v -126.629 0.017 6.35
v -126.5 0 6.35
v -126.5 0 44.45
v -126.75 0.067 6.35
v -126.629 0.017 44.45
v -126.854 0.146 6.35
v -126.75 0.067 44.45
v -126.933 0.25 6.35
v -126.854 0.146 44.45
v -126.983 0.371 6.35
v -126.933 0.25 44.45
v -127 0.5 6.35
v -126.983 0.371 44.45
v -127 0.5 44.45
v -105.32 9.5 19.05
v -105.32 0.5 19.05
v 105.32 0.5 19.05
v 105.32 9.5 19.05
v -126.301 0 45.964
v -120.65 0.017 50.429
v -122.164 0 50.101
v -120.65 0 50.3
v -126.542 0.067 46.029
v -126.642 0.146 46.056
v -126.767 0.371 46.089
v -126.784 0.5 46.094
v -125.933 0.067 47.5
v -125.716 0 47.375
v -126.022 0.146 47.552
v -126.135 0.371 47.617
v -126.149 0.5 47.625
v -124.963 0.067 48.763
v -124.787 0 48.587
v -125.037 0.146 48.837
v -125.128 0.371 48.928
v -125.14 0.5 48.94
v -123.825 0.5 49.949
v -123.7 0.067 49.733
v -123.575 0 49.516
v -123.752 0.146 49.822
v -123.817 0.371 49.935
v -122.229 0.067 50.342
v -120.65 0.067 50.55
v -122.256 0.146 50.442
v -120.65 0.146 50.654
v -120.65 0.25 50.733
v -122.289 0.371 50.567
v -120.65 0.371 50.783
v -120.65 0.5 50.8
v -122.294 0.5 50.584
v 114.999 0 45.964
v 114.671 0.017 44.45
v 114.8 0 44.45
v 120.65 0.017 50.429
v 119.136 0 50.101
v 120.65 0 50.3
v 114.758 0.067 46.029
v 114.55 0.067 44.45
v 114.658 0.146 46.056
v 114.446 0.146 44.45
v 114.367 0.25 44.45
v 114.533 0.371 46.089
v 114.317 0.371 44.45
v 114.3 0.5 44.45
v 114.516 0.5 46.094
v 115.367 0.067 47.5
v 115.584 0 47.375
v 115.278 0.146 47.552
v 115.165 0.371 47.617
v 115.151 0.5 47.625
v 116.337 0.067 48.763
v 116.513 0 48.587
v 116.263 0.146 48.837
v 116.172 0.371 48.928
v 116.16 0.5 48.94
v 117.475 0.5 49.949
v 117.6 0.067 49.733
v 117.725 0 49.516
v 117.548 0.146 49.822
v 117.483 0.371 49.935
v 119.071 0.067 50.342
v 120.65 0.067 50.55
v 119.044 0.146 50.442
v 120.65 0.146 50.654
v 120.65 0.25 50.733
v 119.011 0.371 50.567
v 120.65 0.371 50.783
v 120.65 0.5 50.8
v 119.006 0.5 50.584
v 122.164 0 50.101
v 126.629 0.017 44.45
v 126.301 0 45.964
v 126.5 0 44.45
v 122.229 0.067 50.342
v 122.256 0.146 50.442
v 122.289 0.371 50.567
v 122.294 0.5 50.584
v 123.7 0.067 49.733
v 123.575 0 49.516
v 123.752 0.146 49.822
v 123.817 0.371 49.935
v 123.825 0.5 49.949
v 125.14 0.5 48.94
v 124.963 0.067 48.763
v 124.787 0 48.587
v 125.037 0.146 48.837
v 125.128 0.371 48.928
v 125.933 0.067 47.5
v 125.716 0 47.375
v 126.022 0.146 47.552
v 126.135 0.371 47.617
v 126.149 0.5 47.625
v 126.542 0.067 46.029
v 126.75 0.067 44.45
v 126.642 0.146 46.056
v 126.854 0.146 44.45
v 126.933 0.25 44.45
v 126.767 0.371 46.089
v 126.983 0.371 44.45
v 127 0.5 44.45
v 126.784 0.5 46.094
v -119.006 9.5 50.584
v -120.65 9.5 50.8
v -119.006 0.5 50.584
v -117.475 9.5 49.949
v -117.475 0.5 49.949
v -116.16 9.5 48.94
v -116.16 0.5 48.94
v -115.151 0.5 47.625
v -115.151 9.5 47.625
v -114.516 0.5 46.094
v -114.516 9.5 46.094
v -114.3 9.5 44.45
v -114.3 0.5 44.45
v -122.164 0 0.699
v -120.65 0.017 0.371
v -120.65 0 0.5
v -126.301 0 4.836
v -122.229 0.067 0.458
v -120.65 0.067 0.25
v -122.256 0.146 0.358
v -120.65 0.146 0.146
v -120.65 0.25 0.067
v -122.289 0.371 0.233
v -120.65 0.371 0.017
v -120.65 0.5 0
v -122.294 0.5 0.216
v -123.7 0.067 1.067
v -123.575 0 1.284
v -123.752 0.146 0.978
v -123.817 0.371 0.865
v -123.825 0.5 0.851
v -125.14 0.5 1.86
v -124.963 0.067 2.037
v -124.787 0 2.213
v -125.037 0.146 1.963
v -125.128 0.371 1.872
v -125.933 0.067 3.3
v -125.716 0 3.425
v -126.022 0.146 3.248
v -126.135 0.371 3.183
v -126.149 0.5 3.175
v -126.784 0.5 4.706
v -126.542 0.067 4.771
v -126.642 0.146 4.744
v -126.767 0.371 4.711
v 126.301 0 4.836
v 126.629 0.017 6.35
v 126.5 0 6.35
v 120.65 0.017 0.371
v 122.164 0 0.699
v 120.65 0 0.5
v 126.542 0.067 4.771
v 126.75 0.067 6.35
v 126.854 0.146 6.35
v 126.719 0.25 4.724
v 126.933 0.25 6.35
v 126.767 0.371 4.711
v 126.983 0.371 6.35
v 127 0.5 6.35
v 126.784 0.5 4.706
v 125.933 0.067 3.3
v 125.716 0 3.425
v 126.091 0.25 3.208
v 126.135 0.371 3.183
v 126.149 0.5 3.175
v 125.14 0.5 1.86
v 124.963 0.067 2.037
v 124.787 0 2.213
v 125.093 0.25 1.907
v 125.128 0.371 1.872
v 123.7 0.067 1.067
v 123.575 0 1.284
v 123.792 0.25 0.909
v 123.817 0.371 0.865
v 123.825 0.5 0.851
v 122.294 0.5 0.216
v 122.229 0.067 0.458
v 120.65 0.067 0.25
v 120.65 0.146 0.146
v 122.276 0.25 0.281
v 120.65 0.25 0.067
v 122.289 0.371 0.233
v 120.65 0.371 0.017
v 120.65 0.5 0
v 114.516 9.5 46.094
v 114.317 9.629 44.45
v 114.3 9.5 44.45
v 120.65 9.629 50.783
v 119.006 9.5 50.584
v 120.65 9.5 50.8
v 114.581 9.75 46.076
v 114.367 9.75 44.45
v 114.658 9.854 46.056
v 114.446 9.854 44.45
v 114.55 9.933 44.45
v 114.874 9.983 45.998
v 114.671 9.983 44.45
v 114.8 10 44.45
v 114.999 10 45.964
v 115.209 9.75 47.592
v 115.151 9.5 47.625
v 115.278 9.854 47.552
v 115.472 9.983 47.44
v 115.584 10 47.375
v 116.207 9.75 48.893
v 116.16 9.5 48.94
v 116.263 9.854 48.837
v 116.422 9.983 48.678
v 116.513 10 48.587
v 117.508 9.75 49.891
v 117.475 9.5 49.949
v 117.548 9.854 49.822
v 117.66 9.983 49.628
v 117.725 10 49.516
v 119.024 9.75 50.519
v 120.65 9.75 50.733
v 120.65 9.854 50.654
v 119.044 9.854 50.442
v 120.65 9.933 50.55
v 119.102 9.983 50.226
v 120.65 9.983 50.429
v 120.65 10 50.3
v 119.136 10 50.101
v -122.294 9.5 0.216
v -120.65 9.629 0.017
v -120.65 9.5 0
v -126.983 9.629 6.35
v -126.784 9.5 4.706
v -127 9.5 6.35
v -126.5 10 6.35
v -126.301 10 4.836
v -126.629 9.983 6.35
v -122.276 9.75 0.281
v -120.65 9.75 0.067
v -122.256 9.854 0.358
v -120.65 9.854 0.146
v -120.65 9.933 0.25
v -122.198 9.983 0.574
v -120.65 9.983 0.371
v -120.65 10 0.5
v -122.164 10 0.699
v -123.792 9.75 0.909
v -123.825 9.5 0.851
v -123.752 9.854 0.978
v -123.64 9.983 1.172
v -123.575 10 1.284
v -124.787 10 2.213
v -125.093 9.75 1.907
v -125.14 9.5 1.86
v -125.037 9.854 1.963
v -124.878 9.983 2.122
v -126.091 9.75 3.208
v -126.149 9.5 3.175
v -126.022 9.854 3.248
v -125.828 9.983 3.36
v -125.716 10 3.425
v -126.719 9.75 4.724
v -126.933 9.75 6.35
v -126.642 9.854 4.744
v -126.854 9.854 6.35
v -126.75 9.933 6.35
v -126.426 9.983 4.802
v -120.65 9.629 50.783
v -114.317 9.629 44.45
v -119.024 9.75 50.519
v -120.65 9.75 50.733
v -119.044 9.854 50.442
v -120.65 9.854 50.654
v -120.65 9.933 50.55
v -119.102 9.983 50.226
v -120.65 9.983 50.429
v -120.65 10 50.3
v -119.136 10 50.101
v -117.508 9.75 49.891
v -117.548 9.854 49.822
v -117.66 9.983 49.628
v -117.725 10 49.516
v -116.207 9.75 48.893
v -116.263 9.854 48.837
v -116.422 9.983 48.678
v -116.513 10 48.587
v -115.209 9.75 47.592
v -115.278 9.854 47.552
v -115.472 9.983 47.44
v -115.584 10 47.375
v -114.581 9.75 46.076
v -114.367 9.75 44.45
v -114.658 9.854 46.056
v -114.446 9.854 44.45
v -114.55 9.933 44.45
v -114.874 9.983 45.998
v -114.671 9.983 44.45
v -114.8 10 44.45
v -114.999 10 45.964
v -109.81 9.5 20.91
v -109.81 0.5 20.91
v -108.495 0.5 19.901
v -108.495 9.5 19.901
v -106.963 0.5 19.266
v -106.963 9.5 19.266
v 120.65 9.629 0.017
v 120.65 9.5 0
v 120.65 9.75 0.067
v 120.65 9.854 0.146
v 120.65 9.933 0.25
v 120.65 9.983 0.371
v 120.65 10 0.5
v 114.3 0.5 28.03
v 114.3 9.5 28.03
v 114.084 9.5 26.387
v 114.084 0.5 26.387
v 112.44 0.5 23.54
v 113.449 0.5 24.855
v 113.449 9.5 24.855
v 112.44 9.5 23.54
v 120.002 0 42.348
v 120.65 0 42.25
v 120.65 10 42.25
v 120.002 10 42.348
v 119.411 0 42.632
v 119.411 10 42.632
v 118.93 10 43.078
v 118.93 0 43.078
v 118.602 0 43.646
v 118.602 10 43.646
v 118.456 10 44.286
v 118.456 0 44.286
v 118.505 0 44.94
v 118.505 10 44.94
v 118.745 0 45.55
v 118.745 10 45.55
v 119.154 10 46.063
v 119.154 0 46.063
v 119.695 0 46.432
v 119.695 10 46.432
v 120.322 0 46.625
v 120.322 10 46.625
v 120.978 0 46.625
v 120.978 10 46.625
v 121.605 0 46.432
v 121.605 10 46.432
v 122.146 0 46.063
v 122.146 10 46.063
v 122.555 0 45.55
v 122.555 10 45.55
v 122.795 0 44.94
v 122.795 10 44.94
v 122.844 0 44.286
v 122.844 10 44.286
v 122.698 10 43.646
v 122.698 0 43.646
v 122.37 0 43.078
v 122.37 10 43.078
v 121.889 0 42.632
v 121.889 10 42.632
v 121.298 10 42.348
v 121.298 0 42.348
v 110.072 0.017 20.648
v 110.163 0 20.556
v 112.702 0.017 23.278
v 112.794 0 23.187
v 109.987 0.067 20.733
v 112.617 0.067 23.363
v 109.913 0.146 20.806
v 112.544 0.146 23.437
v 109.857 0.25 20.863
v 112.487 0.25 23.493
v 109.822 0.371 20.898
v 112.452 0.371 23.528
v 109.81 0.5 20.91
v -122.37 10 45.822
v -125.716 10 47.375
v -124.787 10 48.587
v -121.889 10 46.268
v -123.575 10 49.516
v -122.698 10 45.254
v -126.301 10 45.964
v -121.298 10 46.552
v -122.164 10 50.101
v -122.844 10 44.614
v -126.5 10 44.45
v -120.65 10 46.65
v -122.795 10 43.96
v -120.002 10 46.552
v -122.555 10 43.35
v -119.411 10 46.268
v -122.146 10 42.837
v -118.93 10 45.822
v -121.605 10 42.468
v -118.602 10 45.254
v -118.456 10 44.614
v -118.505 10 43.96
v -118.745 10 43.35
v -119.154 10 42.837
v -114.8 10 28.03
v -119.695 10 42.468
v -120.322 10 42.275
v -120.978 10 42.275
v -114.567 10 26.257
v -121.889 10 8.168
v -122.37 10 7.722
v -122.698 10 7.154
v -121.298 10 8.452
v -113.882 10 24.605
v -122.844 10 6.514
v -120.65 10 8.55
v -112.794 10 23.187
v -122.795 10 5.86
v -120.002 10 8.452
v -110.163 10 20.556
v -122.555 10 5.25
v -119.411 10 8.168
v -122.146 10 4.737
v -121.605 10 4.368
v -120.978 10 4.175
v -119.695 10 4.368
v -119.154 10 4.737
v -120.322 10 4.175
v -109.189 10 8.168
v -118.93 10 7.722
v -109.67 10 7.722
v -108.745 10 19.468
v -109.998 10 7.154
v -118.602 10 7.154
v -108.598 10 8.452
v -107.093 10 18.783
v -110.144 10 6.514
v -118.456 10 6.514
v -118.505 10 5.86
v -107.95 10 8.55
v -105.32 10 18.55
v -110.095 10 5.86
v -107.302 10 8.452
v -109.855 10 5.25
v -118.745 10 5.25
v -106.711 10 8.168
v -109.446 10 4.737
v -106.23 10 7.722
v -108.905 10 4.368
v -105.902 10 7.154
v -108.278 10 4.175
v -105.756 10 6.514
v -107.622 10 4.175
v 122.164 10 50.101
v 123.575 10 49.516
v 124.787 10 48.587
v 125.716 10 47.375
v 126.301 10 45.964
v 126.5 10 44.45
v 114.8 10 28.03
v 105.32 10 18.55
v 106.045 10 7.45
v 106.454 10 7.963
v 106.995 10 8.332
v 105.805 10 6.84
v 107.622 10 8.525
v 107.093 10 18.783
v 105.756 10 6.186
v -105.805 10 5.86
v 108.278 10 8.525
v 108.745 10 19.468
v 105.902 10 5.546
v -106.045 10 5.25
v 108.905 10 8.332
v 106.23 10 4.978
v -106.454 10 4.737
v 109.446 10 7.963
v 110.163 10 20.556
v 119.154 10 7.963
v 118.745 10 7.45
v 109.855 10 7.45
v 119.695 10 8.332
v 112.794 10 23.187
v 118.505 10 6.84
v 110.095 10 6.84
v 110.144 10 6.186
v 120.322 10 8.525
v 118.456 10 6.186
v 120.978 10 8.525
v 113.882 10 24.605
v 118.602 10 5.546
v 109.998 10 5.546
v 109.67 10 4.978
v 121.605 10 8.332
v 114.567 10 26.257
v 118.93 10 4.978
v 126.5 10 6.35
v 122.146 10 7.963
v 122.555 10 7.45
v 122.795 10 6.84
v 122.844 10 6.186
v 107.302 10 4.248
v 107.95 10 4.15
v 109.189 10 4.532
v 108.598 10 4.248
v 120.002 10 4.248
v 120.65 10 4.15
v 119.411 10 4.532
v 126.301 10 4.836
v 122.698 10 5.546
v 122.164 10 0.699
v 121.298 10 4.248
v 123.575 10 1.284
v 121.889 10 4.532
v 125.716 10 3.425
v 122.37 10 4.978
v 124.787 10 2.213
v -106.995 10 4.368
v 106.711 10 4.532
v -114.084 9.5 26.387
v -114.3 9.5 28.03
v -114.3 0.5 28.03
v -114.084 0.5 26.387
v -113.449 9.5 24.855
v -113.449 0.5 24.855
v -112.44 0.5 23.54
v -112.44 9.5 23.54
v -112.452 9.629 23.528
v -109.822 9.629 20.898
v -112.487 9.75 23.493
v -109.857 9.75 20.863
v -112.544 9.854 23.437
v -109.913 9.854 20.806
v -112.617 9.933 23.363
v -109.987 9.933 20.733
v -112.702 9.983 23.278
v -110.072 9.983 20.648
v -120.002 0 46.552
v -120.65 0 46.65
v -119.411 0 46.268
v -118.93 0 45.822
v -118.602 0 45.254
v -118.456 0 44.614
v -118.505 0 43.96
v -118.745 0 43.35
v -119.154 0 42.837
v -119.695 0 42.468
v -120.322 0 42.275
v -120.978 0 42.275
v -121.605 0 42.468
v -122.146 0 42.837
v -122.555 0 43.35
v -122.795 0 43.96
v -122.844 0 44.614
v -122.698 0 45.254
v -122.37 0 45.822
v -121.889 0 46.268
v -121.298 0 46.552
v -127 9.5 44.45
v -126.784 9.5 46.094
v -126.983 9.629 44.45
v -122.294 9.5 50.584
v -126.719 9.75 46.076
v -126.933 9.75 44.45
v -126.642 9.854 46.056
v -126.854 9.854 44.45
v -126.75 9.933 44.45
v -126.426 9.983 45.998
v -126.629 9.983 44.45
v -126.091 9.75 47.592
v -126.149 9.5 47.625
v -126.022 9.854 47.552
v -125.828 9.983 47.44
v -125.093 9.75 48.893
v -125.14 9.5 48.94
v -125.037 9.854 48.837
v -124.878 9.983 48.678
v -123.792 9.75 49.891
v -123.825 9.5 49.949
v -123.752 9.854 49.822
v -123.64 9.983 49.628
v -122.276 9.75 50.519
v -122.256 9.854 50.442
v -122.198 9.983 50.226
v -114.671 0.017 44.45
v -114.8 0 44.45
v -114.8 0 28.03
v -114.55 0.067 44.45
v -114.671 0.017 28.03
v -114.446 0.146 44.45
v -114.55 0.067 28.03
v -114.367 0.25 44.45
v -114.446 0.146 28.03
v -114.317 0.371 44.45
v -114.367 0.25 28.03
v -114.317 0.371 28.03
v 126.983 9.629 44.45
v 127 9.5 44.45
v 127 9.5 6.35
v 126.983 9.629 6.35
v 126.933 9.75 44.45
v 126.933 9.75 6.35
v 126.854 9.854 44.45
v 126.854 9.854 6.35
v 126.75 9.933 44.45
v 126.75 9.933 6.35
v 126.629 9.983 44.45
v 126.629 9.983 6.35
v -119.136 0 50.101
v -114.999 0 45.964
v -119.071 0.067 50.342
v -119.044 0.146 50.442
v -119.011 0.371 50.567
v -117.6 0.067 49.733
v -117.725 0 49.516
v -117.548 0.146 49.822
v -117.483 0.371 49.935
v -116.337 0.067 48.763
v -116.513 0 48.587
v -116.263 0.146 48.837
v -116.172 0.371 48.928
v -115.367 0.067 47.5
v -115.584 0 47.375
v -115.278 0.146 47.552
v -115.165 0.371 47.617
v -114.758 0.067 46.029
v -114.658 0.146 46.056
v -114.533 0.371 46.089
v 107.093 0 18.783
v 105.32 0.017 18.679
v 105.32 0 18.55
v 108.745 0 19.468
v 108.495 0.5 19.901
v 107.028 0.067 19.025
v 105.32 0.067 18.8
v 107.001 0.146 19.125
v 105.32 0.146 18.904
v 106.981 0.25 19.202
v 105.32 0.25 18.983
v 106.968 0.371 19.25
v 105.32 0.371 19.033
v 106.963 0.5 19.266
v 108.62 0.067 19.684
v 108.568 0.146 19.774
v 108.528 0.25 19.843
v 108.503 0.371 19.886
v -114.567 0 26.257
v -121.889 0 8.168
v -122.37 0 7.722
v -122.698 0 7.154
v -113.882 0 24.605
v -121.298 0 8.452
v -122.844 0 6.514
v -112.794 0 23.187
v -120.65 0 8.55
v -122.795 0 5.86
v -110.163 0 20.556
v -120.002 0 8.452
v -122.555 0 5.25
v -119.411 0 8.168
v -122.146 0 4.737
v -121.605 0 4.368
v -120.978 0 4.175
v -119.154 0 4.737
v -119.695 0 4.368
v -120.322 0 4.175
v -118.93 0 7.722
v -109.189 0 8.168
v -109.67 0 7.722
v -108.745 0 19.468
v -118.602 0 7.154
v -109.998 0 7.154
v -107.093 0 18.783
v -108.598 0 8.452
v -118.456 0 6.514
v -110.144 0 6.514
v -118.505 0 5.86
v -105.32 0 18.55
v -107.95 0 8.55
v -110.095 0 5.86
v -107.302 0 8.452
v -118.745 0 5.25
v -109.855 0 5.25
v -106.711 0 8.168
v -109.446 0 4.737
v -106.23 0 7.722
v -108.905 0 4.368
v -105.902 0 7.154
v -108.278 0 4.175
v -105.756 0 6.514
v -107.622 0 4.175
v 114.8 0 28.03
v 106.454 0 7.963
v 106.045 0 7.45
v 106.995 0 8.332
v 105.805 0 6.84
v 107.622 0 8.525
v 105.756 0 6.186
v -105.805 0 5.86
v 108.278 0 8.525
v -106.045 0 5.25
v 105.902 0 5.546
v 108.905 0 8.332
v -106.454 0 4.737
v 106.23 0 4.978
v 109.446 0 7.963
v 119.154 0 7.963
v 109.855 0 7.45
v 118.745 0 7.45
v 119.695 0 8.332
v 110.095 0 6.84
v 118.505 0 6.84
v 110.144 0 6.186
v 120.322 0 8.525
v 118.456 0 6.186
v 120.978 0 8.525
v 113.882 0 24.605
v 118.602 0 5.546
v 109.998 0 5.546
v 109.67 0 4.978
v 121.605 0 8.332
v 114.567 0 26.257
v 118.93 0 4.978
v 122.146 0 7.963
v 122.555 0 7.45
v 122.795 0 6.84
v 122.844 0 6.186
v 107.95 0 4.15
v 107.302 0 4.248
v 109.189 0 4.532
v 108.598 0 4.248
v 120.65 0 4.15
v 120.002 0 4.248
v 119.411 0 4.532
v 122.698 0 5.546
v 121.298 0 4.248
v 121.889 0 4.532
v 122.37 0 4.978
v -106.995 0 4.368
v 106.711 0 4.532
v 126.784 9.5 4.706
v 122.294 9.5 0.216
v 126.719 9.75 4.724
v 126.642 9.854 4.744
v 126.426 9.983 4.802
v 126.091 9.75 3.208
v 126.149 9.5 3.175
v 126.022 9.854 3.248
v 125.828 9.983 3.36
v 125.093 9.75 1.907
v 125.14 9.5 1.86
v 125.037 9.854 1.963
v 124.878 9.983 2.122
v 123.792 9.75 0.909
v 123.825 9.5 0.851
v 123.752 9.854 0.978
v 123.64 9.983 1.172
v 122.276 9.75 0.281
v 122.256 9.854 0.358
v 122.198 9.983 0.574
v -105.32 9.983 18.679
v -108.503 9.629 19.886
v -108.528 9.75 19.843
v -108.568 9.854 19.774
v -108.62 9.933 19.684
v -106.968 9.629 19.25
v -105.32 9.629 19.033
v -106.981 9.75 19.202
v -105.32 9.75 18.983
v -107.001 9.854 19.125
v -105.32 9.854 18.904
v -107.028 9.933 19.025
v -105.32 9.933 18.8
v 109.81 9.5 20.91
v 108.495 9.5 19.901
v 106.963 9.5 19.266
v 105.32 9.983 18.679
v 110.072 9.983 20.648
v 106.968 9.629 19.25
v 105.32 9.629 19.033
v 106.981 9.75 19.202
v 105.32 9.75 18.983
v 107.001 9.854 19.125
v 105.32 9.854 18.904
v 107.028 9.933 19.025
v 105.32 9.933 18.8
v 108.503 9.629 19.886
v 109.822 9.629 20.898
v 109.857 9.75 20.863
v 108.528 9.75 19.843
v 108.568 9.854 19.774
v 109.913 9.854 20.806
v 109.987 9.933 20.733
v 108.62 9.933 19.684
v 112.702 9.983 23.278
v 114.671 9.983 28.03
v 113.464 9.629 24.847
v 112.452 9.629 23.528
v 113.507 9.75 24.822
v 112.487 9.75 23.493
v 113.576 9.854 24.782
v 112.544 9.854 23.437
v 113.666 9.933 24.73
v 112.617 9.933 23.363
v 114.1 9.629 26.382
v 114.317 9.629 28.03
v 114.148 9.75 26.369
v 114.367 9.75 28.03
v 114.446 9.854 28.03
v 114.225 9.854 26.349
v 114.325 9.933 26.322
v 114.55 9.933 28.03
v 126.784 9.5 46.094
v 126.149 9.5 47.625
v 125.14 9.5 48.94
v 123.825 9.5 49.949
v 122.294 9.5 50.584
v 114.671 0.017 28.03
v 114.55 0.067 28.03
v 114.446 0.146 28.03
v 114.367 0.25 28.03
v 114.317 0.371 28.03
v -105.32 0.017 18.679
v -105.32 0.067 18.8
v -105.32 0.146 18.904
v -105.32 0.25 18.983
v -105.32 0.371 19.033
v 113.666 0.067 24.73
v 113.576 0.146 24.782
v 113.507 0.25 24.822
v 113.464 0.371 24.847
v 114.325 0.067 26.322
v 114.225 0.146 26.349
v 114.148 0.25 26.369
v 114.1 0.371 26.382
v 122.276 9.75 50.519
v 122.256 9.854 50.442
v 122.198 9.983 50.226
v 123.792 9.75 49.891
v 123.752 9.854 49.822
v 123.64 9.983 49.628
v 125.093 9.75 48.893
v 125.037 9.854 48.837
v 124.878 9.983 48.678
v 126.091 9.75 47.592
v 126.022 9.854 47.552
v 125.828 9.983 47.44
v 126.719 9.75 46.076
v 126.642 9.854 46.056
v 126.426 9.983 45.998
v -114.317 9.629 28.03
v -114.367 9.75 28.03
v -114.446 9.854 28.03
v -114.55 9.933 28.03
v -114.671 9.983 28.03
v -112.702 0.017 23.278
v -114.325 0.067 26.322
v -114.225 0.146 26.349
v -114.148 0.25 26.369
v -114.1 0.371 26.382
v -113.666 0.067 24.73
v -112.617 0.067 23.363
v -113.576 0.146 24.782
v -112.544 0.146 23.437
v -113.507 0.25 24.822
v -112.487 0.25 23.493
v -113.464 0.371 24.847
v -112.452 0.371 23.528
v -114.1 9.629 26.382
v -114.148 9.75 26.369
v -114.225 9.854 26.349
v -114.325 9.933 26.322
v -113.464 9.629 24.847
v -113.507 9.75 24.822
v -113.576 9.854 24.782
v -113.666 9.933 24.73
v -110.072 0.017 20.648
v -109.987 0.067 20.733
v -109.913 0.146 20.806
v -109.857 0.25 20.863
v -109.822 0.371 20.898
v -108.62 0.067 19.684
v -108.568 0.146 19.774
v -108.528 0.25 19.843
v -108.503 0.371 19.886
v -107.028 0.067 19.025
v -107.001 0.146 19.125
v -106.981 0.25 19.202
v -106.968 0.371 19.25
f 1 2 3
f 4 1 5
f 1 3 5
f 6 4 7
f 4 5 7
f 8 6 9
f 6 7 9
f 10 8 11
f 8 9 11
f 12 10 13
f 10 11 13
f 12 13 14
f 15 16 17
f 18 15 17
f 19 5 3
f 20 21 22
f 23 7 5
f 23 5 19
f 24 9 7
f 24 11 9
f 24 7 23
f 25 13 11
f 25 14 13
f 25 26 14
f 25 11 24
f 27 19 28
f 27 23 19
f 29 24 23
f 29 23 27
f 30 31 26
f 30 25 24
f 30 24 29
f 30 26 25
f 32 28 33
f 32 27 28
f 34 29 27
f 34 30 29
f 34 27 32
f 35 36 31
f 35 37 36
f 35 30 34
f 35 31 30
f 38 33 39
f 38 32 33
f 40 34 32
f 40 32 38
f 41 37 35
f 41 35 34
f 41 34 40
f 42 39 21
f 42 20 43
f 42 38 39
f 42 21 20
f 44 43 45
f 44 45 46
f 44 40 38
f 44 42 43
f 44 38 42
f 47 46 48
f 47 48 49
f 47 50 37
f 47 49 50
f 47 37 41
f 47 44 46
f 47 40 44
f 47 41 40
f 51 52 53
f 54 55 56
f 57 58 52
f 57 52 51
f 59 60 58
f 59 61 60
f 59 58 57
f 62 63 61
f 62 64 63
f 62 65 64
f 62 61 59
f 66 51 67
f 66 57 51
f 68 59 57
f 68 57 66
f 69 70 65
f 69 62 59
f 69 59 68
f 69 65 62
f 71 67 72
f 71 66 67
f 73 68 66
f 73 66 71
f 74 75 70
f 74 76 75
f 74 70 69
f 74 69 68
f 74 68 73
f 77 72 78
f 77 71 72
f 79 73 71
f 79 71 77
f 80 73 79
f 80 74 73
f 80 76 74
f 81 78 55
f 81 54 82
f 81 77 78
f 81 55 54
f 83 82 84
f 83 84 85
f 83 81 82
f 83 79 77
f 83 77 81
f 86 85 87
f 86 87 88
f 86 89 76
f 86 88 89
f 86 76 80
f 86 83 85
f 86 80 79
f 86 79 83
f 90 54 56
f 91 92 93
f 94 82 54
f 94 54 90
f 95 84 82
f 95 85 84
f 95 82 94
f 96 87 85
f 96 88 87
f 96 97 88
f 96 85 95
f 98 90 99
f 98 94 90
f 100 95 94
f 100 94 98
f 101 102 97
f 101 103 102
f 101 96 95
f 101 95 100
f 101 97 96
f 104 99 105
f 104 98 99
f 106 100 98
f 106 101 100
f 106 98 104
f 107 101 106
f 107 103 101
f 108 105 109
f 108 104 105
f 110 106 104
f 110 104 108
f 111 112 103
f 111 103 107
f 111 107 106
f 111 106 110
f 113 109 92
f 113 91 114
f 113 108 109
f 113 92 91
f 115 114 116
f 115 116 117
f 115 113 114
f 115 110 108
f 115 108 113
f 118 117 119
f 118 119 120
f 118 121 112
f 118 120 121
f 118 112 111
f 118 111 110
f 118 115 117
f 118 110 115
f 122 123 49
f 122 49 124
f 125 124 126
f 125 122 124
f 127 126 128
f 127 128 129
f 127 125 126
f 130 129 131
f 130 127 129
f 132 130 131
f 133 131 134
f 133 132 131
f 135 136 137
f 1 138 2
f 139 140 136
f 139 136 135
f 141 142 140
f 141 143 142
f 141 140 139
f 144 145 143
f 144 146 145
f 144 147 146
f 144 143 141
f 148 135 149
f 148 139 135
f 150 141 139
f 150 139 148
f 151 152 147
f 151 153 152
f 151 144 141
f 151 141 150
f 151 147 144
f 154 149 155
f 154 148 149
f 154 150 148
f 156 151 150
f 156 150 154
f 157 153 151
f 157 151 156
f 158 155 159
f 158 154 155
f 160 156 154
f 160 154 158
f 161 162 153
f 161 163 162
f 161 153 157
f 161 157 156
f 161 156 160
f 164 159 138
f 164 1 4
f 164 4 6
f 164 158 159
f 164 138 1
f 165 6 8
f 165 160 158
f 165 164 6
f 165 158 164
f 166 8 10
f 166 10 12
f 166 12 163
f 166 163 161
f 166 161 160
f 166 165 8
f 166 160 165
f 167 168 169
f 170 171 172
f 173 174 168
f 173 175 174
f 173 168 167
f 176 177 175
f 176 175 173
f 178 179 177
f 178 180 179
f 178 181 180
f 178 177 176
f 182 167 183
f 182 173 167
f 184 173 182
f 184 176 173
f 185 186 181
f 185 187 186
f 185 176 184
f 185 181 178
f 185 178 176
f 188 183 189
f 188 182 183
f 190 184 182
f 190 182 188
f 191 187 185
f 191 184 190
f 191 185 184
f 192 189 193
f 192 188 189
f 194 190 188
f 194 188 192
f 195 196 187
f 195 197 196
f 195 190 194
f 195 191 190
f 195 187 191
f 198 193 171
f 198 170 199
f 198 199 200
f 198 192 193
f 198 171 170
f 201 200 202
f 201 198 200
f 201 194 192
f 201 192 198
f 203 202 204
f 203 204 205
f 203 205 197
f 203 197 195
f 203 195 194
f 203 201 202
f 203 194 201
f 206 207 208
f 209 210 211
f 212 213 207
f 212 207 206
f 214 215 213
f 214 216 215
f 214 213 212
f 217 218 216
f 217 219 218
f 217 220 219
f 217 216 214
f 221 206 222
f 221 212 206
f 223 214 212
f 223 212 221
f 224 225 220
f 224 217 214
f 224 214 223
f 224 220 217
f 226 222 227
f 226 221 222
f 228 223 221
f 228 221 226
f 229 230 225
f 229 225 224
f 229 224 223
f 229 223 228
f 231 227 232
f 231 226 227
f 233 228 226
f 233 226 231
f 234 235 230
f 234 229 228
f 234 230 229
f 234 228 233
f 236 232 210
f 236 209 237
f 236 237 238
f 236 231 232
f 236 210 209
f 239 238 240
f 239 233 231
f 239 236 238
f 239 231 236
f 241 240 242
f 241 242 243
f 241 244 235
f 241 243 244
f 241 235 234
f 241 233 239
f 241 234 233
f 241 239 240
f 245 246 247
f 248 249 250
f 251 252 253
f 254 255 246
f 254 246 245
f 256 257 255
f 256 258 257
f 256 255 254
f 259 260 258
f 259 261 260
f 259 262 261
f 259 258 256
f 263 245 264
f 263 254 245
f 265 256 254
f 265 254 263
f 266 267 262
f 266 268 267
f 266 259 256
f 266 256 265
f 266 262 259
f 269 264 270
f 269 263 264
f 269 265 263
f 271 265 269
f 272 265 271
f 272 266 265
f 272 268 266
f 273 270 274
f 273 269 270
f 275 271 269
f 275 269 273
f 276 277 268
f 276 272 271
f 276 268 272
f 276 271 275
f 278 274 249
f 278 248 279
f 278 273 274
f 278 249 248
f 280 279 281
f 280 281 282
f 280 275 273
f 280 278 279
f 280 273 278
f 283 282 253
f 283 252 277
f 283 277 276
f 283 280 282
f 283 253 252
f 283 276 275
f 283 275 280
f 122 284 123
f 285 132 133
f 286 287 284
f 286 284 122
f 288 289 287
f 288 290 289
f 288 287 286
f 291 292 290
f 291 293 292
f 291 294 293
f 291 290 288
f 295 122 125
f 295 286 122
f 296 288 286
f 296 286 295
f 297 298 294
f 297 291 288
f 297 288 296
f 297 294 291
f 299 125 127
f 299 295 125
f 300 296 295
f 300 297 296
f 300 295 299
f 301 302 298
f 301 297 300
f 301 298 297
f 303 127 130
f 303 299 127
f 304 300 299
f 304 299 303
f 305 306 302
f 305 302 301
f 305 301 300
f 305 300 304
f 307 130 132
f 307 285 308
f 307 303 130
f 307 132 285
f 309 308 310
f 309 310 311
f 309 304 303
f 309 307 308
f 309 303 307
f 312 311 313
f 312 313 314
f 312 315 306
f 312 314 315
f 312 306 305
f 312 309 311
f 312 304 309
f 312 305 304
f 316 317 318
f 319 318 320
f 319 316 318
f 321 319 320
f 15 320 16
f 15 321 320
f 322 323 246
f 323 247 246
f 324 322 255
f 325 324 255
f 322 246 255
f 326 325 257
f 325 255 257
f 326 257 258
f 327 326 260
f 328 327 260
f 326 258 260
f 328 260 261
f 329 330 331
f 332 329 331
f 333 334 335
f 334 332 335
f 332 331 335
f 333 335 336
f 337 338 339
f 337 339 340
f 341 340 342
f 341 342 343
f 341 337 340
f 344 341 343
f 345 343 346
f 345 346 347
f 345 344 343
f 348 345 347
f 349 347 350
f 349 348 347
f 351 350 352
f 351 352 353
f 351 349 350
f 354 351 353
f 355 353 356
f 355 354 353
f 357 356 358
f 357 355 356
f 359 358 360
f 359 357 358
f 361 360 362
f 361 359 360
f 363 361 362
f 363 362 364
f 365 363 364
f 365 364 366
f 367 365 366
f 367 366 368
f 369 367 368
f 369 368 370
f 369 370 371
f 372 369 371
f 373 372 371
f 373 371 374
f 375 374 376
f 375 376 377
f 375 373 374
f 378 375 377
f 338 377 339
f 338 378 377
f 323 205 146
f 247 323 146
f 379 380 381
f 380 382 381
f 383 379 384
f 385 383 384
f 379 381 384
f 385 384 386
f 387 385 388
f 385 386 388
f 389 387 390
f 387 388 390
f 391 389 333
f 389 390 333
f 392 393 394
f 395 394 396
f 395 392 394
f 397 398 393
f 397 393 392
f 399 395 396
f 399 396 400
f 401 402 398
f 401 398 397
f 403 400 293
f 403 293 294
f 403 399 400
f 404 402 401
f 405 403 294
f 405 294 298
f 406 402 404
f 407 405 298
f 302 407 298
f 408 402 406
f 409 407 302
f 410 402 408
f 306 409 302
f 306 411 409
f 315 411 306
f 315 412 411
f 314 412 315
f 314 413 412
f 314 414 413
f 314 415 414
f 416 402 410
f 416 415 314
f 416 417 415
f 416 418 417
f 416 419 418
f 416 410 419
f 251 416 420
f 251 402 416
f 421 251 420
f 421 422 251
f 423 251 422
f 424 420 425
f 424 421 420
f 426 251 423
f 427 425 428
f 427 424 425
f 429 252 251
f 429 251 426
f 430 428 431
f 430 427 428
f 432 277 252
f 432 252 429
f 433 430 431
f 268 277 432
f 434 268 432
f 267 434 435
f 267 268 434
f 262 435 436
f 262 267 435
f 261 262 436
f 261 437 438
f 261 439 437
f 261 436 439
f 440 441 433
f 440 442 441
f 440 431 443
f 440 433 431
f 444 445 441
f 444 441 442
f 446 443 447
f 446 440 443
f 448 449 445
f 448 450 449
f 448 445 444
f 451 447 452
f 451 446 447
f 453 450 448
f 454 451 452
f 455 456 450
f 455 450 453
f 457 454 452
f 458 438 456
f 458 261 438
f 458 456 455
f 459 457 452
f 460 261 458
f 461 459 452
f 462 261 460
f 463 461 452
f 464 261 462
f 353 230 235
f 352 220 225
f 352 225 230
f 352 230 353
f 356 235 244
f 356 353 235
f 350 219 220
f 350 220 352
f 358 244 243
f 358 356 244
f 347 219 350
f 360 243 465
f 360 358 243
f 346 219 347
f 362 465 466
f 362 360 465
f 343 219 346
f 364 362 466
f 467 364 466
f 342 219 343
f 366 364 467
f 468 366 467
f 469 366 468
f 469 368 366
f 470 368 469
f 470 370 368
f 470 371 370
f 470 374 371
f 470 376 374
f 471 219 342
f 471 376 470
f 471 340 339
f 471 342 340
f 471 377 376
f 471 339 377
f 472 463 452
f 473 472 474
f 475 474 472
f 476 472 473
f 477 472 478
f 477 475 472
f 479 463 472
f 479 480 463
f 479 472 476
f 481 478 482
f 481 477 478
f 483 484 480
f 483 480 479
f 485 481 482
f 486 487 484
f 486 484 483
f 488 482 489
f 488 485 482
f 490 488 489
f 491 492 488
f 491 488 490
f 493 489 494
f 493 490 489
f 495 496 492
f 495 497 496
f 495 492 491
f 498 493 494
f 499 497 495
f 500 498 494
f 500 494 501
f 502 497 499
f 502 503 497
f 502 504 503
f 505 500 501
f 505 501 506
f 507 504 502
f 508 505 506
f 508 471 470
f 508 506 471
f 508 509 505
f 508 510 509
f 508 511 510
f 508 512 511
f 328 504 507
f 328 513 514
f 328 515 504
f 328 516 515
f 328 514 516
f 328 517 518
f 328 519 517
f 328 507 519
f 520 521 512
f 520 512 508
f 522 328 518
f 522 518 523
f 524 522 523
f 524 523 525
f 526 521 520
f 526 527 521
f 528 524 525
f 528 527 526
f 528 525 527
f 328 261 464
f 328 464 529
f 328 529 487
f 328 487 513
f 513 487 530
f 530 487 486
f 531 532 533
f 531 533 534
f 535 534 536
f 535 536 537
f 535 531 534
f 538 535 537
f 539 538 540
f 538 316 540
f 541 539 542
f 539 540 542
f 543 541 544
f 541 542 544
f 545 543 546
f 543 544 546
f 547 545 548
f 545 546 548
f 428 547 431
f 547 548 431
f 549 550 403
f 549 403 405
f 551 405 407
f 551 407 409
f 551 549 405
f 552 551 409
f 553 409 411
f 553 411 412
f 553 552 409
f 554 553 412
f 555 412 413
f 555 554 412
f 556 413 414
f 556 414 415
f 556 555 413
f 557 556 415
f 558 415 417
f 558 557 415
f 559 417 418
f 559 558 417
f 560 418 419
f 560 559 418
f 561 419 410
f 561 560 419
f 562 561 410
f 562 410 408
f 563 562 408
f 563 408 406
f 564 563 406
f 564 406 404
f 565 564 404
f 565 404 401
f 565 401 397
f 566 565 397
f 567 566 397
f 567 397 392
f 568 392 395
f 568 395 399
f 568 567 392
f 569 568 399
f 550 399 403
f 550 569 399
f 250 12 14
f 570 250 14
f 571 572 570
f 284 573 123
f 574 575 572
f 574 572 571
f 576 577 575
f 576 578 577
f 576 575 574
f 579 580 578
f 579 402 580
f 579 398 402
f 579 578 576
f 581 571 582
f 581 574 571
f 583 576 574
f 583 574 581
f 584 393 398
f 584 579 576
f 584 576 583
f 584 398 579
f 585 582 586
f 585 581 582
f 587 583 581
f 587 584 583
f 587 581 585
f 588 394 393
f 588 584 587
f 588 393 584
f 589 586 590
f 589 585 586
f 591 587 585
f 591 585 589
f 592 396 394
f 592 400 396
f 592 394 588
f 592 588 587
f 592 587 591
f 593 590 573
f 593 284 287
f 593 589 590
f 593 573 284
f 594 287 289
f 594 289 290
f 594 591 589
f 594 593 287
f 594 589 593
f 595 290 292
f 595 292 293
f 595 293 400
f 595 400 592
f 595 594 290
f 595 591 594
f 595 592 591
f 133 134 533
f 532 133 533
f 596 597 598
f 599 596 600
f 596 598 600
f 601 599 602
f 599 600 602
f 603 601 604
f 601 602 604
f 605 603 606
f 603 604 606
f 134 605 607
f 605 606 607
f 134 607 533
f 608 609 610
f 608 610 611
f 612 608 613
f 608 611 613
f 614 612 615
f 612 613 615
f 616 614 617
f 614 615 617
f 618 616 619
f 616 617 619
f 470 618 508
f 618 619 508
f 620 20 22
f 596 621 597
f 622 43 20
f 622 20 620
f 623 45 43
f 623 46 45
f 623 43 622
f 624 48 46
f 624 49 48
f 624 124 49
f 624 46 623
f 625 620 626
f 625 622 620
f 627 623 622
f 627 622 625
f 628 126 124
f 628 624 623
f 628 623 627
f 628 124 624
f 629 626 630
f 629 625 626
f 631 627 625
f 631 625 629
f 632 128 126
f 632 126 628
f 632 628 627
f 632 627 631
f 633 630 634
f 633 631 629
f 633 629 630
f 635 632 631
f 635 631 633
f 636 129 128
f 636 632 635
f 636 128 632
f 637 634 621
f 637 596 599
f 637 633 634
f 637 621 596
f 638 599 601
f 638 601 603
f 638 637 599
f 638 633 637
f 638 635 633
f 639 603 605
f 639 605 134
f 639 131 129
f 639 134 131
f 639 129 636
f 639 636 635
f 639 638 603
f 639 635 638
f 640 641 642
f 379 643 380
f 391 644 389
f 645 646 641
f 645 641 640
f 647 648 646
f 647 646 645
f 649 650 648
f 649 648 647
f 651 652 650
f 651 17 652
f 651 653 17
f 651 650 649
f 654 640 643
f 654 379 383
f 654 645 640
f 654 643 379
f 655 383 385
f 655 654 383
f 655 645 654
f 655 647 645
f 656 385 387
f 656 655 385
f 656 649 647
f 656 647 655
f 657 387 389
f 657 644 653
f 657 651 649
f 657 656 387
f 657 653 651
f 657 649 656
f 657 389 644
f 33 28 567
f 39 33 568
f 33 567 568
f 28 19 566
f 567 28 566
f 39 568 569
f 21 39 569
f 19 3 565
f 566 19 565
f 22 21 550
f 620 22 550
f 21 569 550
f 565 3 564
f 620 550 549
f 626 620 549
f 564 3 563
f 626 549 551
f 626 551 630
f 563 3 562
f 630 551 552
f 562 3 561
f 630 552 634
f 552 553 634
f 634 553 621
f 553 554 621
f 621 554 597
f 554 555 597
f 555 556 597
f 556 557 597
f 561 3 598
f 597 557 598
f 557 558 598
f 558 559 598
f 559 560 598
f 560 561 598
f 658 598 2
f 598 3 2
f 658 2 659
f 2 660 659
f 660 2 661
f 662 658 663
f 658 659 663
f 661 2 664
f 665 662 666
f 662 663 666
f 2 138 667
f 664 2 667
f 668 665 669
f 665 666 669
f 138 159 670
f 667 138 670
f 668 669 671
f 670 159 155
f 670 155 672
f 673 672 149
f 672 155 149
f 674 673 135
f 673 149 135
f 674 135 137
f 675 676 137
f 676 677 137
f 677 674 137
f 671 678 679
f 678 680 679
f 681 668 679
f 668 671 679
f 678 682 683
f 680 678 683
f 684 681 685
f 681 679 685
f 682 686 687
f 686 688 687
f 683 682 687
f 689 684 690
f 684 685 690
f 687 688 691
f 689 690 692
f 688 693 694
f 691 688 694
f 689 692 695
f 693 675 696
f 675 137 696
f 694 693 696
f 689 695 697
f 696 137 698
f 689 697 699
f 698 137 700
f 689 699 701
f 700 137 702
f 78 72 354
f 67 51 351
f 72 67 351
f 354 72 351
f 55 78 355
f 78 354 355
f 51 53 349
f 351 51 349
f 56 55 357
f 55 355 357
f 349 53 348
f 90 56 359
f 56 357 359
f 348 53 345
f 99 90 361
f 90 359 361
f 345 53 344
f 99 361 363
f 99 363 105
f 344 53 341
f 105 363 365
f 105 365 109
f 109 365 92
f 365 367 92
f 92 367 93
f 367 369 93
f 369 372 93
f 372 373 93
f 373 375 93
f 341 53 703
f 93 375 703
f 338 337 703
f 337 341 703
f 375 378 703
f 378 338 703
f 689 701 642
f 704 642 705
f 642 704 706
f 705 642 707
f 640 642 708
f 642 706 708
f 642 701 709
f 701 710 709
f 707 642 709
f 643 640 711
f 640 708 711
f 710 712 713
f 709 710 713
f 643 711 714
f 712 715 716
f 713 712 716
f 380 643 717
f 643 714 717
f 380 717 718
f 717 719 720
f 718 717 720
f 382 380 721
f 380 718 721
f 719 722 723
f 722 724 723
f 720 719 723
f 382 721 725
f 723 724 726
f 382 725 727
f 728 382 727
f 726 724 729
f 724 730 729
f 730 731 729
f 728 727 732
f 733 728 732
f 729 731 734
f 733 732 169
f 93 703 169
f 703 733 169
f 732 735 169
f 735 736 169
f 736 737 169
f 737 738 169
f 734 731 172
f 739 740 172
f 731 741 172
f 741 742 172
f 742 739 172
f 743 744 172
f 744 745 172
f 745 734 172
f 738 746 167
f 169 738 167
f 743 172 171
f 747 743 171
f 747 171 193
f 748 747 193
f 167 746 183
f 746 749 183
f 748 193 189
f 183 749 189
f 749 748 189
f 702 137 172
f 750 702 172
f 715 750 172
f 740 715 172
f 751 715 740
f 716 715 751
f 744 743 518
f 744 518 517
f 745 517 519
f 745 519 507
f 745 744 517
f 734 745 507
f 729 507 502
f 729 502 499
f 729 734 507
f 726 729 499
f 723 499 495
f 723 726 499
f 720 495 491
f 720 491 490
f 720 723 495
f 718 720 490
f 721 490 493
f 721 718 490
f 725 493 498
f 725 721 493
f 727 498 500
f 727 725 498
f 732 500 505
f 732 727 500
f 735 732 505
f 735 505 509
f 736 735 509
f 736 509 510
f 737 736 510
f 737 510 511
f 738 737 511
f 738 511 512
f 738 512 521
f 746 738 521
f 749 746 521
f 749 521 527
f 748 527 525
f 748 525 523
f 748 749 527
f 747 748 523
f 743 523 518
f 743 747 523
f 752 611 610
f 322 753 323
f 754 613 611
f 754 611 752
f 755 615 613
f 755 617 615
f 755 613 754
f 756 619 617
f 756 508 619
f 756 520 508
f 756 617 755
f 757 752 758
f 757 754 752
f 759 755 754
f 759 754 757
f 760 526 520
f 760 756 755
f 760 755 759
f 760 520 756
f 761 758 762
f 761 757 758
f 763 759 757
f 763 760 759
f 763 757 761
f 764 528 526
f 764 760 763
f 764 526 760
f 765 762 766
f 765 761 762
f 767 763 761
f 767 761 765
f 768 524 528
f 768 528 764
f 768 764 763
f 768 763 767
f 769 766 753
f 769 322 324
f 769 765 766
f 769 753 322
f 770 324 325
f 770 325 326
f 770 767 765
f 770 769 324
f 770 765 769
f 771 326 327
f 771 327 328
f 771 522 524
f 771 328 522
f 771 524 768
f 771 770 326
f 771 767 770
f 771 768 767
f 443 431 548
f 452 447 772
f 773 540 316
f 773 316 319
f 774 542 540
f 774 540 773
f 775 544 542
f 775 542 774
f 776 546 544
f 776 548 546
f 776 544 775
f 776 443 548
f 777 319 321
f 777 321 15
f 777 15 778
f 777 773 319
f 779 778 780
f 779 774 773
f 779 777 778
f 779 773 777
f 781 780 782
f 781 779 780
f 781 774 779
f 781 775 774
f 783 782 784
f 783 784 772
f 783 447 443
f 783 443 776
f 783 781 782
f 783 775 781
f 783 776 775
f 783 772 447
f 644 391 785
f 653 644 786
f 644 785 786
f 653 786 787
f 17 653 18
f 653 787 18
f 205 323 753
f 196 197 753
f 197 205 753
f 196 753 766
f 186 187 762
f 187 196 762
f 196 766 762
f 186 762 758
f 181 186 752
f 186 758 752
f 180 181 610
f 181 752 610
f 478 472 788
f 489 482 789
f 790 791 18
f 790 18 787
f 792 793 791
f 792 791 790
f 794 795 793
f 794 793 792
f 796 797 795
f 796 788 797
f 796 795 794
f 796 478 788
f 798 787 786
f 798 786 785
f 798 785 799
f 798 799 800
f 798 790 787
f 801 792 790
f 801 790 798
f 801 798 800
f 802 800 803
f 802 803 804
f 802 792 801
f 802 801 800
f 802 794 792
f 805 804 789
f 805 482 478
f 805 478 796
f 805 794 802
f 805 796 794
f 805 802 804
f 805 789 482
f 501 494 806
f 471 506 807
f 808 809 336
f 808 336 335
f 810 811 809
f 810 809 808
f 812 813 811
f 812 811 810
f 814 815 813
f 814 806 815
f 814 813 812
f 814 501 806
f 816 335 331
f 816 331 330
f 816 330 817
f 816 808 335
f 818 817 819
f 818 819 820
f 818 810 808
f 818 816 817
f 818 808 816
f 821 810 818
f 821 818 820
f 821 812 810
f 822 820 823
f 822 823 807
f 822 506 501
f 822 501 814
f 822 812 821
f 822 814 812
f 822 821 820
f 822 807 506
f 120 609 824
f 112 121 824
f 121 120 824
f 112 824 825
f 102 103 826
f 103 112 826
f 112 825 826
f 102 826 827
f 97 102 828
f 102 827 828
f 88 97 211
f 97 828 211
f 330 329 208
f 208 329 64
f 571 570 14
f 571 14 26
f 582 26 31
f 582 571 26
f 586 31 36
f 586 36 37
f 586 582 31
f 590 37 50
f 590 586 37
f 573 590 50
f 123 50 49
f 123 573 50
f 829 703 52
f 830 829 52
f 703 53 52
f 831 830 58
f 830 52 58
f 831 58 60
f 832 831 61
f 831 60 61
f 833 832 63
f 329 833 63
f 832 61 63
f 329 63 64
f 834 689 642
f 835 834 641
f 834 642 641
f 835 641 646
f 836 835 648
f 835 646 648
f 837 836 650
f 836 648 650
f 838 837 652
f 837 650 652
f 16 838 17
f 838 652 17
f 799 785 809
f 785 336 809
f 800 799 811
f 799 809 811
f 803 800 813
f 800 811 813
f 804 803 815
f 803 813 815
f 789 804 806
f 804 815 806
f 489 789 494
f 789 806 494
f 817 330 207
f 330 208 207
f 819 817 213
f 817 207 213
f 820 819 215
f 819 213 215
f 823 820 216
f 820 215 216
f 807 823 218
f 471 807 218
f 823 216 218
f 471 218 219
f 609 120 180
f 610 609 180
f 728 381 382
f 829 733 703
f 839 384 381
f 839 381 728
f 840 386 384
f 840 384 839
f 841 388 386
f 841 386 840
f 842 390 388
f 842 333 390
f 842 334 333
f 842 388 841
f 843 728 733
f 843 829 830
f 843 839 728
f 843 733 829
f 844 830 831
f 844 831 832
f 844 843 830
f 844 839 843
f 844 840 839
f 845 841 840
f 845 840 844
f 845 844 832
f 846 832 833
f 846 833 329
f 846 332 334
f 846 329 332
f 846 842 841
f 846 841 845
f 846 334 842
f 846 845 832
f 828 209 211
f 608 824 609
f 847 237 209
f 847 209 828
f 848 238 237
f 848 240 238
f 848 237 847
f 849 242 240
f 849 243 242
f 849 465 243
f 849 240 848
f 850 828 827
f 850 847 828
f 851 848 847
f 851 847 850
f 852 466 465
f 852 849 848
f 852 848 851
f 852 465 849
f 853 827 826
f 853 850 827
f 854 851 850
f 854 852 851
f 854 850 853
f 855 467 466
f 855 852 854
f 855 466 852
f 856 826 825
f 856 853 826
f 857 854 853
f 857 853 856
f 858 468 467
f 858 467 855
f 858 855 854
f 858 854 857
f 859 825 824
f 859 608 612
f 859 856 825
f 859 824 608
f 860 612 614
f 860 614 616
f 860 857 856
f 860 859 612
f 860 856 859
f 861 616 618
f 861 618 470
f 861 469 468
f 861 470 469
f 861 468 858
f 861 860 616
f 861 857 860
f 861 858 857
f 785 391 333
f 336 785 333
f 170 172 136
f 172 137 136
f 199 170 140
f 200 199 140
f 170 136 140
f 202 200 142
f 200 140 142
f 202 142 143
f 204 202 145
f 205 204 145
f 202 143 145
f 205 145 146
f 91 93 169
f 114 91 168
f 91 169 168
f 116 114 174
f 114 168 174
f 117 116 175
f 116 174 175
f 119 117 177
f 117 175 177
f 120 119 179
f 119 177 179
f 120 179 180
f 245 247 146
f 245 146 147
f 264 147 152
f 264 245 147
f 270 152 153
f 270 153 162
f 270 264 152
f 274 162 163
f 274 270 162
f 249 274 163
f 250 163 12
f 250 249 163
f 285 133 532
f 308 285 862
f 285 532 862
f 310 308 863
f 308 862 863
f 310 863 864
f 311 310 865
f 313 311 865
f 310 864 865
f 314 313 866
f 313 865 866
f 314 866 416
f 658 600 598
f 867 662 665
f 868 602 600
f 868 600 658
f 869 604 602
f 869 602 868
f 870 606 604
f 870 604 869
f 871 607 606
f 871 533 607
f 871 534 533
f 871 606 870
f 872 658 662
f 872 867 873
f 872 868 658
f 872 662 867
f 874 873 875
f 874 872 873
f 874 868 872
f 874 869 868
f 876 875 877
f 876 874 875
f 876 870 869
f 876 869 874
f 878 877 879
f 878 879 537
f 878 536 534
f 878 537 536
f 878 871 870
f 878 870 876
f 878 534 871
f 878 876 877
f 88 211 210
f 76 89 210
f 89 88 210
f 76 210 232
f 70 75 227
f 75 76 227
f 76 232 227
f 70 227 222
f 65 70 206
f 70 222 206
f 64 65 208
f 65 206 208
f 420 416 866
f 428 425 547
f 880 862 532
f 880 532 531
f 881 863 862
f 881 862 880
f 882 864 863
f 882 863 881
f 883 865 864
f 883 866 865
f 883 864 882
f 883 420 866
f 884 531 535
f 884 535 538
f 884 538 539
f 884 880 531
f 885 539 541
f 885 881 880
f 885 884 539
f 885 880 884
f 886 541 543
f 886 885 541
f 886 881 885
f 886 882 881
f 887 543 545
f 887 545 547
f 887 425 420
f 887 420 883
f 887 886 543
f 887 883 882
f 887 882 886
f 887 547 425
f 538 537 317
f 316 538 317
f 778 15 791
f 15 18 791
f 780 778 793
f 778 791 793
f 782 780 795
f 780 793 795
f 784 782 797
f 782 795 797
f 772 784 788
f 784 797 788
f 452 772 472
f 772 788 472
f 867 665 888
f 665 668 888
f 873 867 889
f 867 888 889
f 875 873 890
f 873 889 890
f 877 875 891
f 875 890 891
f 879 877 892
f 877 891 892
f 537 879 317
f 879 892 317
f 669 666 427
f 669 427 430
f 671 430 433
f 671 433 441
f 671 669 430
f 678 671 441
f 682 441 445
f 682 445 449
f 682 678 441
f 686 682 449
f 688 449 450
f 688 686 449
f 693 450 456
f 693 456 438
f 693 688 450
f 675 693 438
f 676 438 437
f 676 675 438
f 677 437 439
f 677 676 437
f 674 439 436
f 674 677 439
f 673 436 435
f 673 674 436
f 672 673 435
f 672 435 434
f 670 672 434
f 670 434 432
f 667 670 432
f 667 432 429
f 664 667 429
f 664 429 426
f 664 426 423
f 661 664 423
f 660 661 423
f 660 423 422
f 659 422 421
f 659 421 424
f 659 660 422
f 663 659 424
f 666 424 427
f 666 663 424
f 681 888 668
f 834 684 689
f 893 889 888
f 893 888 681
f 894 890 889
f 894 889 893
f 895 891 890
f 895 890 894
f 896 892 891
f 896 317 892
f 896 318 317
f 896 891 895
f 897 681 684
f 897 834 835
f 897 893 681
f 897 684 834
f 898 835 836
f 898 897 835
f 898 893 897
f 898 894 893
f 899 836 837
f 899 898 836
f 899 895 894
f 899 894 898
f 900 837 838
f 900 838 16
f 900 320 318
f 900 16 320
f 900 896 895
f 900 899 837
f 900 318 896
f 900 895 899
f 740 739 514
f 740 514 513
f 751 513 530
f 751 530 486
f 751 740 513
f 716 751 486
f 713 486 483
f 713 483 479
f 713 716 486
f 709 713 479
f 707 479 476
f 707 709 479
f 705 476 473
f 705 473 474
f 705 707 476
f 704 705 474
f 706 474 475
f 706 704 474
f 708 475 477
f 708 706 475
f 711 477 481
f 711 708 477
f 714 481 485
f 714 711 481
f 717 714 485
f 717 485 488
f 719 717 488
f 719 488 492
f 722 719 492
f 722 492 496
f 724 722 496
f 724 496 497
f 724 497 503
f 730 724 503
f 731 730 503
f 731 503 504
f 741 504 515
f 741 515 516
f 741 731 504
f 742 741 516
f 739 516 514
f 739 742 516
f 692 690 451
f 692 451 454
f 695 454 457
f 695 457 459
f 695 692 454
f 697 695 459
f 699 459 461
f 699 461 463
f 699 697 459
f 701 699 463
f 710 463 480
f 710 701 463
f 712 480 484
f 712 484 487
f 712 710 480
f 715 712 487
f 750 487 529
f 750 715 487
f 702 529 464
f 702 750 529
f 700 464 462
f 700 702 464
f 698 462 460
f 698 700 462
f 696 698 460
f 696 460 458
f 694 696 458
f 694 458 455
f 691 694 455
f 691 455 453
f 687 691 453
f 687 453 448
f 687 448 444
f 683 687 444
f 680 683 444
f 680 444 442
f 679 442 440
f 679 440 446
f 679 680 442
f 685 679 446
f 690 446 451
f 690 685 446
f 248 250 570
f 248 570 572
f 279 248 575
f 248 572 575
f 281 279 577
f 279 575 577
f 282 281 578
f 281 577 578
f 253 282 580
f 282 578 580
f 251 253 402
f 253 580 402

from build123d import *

# Parameters (mm, degrees)
SKETCH1_R           = 2.2
BOSS_EXTRUDE1_DEPTH = 10
FILLET1_R           = 6.35
FILLET2_R           = 6.35
FILLET3_R           = 0.5


with BuildPart() as part:
    # Sketch1 → Boss-Extrude1 (new body)
    with BuildSketch(Plane(origin=(0, 0, 0), x_dir=(1, 0, 0), z_dir=(0, 1, 0))):
        Polygon((127, 0), (-127, 0), (-127, -50.8), (-114.3, -50.8), (-114.3, -25.4), (-107.95, -19.05), (107.95, -19.05), (114.3, -25.4), (114.3, -50.8), (127, -50.8), align=None)
        with Locations(Location((-120.65, -6.35, 0), (0, 0, 270))):
            Circle(SKETCH1_R, mode=Mode.SUBTRACT)
        with Locations(Location((-107.95, -6.35, 0), (0, 0, 270))):
            Circle(SKETCH1_R, mode=Mode.SUBTRACT)
        with Locations(Location((-120.65, -44.45, 0), (0, 0, 270))):
            Circle(SKETCH1_R, mode=Mode.SUBTRACT)
        with Locations(Location((120.65, -44.45, 0), (0, 0, 90))):
            Circle(SKETCH1_R, mode=Mode.SUBTRACT)
        with Locations(Location((107.95, -6.35, 0), (0, 0, 90))):
            Circle(SKETCH1_R, mode=Mode.SUBTRACT)
        with Locations(Location((120.65, -6.35, 0), (0, 0, 90))):
            Circle(SKETCH1_R, mode=Mode.SUBTRACT)
    extrude(amount=BOSS_EXTRUDE1_DEPTH)

    # Fillet1
    fillet1_edges = [part.edges().sort_by_distance(p)[0] for p in [
        (127, 5, 0),
        (127, 5, 50.8),
        (114.3, 5, 50.8),
        (-114.3, 5, 50.8),
        (-127, 5, 50.8),
        (-127, 5, 0),
    ]]
    fillet(fillet1_edges, radius=FILLET1_R - 0.0001)  # a hair under: the kernel refuses the full size

    # Fillet2
    fillet2_edges = [part.edges().sort_by_distance(p)[0] for p in [
        (114.3, 5, 25.4),
        (107.95, 5, 19.05),
        (-107.95, 5, 19.05),
        (-114.3, 5, 25.4),
    ]]
    fillet(fillet2_edges, radius=FILLET2_R)

    # Fillet3
    fillet3_edges = [part.edges().sort_by_distance(p)[0] for p in [
        (0, 0, 0),
        (0, 10, 0),
        (-127, 0, 25.4),
        (127, 0, 25.4),
        (-114.3, 0, 36.240178061),
        (-125.14015735, 0, 1.85984265),
        (-125.14015735, 0, 48.94015735),
        (-116.15984265, 0, 48.94015735),
        (116.15984265, 0, 48.94015735),
        (125.14015735, 0, 48.94015735),
        (125.14015735, 0, 1.85984265),
        (127, 10, 25.4),
        (-127, 10, 25.4),
        (-114.3, 10, 36.240178061),
        (-125.14015735, 10, 1.85984265),
        (-125.14015735, 10, 48.94015735),
        (-116.15984265, 10, 48.94015735),
        (116.15984265, 10, 48.94015735),
        (125.14015735, 10, 48.94015735),
        (125.14015735, 10, 1.85984265),
        (114.3, 0, 36.240178061),
        (114.3, 10, 36.240178061),
        (111.125, 0, 22.225),
        (111.125, 10, 22.225),
        (0, 0, 19.05),
        (0, 10, 19.05),
        (-111.125, 0, 22.225),
        (-111.125, 10, 22.225),
        (113.816635031, 0, 25.600216326),
        (113.816635031, 10, 25.600216326),
        (107.749783674, 0, 19.533364969),
        (107.749783674, 10, 19.533364969),
        (-113.816635031, 0, 25.600216326),
        (-113.816635031, 10, 25.600216326),
        (-107.749783674, 0, 19.533364969),
        (-107.749783674, 10, 19.533364969),
    ]]
    fillet(fillet3_edges, radius=FILLET3_R)


solid = part.part
